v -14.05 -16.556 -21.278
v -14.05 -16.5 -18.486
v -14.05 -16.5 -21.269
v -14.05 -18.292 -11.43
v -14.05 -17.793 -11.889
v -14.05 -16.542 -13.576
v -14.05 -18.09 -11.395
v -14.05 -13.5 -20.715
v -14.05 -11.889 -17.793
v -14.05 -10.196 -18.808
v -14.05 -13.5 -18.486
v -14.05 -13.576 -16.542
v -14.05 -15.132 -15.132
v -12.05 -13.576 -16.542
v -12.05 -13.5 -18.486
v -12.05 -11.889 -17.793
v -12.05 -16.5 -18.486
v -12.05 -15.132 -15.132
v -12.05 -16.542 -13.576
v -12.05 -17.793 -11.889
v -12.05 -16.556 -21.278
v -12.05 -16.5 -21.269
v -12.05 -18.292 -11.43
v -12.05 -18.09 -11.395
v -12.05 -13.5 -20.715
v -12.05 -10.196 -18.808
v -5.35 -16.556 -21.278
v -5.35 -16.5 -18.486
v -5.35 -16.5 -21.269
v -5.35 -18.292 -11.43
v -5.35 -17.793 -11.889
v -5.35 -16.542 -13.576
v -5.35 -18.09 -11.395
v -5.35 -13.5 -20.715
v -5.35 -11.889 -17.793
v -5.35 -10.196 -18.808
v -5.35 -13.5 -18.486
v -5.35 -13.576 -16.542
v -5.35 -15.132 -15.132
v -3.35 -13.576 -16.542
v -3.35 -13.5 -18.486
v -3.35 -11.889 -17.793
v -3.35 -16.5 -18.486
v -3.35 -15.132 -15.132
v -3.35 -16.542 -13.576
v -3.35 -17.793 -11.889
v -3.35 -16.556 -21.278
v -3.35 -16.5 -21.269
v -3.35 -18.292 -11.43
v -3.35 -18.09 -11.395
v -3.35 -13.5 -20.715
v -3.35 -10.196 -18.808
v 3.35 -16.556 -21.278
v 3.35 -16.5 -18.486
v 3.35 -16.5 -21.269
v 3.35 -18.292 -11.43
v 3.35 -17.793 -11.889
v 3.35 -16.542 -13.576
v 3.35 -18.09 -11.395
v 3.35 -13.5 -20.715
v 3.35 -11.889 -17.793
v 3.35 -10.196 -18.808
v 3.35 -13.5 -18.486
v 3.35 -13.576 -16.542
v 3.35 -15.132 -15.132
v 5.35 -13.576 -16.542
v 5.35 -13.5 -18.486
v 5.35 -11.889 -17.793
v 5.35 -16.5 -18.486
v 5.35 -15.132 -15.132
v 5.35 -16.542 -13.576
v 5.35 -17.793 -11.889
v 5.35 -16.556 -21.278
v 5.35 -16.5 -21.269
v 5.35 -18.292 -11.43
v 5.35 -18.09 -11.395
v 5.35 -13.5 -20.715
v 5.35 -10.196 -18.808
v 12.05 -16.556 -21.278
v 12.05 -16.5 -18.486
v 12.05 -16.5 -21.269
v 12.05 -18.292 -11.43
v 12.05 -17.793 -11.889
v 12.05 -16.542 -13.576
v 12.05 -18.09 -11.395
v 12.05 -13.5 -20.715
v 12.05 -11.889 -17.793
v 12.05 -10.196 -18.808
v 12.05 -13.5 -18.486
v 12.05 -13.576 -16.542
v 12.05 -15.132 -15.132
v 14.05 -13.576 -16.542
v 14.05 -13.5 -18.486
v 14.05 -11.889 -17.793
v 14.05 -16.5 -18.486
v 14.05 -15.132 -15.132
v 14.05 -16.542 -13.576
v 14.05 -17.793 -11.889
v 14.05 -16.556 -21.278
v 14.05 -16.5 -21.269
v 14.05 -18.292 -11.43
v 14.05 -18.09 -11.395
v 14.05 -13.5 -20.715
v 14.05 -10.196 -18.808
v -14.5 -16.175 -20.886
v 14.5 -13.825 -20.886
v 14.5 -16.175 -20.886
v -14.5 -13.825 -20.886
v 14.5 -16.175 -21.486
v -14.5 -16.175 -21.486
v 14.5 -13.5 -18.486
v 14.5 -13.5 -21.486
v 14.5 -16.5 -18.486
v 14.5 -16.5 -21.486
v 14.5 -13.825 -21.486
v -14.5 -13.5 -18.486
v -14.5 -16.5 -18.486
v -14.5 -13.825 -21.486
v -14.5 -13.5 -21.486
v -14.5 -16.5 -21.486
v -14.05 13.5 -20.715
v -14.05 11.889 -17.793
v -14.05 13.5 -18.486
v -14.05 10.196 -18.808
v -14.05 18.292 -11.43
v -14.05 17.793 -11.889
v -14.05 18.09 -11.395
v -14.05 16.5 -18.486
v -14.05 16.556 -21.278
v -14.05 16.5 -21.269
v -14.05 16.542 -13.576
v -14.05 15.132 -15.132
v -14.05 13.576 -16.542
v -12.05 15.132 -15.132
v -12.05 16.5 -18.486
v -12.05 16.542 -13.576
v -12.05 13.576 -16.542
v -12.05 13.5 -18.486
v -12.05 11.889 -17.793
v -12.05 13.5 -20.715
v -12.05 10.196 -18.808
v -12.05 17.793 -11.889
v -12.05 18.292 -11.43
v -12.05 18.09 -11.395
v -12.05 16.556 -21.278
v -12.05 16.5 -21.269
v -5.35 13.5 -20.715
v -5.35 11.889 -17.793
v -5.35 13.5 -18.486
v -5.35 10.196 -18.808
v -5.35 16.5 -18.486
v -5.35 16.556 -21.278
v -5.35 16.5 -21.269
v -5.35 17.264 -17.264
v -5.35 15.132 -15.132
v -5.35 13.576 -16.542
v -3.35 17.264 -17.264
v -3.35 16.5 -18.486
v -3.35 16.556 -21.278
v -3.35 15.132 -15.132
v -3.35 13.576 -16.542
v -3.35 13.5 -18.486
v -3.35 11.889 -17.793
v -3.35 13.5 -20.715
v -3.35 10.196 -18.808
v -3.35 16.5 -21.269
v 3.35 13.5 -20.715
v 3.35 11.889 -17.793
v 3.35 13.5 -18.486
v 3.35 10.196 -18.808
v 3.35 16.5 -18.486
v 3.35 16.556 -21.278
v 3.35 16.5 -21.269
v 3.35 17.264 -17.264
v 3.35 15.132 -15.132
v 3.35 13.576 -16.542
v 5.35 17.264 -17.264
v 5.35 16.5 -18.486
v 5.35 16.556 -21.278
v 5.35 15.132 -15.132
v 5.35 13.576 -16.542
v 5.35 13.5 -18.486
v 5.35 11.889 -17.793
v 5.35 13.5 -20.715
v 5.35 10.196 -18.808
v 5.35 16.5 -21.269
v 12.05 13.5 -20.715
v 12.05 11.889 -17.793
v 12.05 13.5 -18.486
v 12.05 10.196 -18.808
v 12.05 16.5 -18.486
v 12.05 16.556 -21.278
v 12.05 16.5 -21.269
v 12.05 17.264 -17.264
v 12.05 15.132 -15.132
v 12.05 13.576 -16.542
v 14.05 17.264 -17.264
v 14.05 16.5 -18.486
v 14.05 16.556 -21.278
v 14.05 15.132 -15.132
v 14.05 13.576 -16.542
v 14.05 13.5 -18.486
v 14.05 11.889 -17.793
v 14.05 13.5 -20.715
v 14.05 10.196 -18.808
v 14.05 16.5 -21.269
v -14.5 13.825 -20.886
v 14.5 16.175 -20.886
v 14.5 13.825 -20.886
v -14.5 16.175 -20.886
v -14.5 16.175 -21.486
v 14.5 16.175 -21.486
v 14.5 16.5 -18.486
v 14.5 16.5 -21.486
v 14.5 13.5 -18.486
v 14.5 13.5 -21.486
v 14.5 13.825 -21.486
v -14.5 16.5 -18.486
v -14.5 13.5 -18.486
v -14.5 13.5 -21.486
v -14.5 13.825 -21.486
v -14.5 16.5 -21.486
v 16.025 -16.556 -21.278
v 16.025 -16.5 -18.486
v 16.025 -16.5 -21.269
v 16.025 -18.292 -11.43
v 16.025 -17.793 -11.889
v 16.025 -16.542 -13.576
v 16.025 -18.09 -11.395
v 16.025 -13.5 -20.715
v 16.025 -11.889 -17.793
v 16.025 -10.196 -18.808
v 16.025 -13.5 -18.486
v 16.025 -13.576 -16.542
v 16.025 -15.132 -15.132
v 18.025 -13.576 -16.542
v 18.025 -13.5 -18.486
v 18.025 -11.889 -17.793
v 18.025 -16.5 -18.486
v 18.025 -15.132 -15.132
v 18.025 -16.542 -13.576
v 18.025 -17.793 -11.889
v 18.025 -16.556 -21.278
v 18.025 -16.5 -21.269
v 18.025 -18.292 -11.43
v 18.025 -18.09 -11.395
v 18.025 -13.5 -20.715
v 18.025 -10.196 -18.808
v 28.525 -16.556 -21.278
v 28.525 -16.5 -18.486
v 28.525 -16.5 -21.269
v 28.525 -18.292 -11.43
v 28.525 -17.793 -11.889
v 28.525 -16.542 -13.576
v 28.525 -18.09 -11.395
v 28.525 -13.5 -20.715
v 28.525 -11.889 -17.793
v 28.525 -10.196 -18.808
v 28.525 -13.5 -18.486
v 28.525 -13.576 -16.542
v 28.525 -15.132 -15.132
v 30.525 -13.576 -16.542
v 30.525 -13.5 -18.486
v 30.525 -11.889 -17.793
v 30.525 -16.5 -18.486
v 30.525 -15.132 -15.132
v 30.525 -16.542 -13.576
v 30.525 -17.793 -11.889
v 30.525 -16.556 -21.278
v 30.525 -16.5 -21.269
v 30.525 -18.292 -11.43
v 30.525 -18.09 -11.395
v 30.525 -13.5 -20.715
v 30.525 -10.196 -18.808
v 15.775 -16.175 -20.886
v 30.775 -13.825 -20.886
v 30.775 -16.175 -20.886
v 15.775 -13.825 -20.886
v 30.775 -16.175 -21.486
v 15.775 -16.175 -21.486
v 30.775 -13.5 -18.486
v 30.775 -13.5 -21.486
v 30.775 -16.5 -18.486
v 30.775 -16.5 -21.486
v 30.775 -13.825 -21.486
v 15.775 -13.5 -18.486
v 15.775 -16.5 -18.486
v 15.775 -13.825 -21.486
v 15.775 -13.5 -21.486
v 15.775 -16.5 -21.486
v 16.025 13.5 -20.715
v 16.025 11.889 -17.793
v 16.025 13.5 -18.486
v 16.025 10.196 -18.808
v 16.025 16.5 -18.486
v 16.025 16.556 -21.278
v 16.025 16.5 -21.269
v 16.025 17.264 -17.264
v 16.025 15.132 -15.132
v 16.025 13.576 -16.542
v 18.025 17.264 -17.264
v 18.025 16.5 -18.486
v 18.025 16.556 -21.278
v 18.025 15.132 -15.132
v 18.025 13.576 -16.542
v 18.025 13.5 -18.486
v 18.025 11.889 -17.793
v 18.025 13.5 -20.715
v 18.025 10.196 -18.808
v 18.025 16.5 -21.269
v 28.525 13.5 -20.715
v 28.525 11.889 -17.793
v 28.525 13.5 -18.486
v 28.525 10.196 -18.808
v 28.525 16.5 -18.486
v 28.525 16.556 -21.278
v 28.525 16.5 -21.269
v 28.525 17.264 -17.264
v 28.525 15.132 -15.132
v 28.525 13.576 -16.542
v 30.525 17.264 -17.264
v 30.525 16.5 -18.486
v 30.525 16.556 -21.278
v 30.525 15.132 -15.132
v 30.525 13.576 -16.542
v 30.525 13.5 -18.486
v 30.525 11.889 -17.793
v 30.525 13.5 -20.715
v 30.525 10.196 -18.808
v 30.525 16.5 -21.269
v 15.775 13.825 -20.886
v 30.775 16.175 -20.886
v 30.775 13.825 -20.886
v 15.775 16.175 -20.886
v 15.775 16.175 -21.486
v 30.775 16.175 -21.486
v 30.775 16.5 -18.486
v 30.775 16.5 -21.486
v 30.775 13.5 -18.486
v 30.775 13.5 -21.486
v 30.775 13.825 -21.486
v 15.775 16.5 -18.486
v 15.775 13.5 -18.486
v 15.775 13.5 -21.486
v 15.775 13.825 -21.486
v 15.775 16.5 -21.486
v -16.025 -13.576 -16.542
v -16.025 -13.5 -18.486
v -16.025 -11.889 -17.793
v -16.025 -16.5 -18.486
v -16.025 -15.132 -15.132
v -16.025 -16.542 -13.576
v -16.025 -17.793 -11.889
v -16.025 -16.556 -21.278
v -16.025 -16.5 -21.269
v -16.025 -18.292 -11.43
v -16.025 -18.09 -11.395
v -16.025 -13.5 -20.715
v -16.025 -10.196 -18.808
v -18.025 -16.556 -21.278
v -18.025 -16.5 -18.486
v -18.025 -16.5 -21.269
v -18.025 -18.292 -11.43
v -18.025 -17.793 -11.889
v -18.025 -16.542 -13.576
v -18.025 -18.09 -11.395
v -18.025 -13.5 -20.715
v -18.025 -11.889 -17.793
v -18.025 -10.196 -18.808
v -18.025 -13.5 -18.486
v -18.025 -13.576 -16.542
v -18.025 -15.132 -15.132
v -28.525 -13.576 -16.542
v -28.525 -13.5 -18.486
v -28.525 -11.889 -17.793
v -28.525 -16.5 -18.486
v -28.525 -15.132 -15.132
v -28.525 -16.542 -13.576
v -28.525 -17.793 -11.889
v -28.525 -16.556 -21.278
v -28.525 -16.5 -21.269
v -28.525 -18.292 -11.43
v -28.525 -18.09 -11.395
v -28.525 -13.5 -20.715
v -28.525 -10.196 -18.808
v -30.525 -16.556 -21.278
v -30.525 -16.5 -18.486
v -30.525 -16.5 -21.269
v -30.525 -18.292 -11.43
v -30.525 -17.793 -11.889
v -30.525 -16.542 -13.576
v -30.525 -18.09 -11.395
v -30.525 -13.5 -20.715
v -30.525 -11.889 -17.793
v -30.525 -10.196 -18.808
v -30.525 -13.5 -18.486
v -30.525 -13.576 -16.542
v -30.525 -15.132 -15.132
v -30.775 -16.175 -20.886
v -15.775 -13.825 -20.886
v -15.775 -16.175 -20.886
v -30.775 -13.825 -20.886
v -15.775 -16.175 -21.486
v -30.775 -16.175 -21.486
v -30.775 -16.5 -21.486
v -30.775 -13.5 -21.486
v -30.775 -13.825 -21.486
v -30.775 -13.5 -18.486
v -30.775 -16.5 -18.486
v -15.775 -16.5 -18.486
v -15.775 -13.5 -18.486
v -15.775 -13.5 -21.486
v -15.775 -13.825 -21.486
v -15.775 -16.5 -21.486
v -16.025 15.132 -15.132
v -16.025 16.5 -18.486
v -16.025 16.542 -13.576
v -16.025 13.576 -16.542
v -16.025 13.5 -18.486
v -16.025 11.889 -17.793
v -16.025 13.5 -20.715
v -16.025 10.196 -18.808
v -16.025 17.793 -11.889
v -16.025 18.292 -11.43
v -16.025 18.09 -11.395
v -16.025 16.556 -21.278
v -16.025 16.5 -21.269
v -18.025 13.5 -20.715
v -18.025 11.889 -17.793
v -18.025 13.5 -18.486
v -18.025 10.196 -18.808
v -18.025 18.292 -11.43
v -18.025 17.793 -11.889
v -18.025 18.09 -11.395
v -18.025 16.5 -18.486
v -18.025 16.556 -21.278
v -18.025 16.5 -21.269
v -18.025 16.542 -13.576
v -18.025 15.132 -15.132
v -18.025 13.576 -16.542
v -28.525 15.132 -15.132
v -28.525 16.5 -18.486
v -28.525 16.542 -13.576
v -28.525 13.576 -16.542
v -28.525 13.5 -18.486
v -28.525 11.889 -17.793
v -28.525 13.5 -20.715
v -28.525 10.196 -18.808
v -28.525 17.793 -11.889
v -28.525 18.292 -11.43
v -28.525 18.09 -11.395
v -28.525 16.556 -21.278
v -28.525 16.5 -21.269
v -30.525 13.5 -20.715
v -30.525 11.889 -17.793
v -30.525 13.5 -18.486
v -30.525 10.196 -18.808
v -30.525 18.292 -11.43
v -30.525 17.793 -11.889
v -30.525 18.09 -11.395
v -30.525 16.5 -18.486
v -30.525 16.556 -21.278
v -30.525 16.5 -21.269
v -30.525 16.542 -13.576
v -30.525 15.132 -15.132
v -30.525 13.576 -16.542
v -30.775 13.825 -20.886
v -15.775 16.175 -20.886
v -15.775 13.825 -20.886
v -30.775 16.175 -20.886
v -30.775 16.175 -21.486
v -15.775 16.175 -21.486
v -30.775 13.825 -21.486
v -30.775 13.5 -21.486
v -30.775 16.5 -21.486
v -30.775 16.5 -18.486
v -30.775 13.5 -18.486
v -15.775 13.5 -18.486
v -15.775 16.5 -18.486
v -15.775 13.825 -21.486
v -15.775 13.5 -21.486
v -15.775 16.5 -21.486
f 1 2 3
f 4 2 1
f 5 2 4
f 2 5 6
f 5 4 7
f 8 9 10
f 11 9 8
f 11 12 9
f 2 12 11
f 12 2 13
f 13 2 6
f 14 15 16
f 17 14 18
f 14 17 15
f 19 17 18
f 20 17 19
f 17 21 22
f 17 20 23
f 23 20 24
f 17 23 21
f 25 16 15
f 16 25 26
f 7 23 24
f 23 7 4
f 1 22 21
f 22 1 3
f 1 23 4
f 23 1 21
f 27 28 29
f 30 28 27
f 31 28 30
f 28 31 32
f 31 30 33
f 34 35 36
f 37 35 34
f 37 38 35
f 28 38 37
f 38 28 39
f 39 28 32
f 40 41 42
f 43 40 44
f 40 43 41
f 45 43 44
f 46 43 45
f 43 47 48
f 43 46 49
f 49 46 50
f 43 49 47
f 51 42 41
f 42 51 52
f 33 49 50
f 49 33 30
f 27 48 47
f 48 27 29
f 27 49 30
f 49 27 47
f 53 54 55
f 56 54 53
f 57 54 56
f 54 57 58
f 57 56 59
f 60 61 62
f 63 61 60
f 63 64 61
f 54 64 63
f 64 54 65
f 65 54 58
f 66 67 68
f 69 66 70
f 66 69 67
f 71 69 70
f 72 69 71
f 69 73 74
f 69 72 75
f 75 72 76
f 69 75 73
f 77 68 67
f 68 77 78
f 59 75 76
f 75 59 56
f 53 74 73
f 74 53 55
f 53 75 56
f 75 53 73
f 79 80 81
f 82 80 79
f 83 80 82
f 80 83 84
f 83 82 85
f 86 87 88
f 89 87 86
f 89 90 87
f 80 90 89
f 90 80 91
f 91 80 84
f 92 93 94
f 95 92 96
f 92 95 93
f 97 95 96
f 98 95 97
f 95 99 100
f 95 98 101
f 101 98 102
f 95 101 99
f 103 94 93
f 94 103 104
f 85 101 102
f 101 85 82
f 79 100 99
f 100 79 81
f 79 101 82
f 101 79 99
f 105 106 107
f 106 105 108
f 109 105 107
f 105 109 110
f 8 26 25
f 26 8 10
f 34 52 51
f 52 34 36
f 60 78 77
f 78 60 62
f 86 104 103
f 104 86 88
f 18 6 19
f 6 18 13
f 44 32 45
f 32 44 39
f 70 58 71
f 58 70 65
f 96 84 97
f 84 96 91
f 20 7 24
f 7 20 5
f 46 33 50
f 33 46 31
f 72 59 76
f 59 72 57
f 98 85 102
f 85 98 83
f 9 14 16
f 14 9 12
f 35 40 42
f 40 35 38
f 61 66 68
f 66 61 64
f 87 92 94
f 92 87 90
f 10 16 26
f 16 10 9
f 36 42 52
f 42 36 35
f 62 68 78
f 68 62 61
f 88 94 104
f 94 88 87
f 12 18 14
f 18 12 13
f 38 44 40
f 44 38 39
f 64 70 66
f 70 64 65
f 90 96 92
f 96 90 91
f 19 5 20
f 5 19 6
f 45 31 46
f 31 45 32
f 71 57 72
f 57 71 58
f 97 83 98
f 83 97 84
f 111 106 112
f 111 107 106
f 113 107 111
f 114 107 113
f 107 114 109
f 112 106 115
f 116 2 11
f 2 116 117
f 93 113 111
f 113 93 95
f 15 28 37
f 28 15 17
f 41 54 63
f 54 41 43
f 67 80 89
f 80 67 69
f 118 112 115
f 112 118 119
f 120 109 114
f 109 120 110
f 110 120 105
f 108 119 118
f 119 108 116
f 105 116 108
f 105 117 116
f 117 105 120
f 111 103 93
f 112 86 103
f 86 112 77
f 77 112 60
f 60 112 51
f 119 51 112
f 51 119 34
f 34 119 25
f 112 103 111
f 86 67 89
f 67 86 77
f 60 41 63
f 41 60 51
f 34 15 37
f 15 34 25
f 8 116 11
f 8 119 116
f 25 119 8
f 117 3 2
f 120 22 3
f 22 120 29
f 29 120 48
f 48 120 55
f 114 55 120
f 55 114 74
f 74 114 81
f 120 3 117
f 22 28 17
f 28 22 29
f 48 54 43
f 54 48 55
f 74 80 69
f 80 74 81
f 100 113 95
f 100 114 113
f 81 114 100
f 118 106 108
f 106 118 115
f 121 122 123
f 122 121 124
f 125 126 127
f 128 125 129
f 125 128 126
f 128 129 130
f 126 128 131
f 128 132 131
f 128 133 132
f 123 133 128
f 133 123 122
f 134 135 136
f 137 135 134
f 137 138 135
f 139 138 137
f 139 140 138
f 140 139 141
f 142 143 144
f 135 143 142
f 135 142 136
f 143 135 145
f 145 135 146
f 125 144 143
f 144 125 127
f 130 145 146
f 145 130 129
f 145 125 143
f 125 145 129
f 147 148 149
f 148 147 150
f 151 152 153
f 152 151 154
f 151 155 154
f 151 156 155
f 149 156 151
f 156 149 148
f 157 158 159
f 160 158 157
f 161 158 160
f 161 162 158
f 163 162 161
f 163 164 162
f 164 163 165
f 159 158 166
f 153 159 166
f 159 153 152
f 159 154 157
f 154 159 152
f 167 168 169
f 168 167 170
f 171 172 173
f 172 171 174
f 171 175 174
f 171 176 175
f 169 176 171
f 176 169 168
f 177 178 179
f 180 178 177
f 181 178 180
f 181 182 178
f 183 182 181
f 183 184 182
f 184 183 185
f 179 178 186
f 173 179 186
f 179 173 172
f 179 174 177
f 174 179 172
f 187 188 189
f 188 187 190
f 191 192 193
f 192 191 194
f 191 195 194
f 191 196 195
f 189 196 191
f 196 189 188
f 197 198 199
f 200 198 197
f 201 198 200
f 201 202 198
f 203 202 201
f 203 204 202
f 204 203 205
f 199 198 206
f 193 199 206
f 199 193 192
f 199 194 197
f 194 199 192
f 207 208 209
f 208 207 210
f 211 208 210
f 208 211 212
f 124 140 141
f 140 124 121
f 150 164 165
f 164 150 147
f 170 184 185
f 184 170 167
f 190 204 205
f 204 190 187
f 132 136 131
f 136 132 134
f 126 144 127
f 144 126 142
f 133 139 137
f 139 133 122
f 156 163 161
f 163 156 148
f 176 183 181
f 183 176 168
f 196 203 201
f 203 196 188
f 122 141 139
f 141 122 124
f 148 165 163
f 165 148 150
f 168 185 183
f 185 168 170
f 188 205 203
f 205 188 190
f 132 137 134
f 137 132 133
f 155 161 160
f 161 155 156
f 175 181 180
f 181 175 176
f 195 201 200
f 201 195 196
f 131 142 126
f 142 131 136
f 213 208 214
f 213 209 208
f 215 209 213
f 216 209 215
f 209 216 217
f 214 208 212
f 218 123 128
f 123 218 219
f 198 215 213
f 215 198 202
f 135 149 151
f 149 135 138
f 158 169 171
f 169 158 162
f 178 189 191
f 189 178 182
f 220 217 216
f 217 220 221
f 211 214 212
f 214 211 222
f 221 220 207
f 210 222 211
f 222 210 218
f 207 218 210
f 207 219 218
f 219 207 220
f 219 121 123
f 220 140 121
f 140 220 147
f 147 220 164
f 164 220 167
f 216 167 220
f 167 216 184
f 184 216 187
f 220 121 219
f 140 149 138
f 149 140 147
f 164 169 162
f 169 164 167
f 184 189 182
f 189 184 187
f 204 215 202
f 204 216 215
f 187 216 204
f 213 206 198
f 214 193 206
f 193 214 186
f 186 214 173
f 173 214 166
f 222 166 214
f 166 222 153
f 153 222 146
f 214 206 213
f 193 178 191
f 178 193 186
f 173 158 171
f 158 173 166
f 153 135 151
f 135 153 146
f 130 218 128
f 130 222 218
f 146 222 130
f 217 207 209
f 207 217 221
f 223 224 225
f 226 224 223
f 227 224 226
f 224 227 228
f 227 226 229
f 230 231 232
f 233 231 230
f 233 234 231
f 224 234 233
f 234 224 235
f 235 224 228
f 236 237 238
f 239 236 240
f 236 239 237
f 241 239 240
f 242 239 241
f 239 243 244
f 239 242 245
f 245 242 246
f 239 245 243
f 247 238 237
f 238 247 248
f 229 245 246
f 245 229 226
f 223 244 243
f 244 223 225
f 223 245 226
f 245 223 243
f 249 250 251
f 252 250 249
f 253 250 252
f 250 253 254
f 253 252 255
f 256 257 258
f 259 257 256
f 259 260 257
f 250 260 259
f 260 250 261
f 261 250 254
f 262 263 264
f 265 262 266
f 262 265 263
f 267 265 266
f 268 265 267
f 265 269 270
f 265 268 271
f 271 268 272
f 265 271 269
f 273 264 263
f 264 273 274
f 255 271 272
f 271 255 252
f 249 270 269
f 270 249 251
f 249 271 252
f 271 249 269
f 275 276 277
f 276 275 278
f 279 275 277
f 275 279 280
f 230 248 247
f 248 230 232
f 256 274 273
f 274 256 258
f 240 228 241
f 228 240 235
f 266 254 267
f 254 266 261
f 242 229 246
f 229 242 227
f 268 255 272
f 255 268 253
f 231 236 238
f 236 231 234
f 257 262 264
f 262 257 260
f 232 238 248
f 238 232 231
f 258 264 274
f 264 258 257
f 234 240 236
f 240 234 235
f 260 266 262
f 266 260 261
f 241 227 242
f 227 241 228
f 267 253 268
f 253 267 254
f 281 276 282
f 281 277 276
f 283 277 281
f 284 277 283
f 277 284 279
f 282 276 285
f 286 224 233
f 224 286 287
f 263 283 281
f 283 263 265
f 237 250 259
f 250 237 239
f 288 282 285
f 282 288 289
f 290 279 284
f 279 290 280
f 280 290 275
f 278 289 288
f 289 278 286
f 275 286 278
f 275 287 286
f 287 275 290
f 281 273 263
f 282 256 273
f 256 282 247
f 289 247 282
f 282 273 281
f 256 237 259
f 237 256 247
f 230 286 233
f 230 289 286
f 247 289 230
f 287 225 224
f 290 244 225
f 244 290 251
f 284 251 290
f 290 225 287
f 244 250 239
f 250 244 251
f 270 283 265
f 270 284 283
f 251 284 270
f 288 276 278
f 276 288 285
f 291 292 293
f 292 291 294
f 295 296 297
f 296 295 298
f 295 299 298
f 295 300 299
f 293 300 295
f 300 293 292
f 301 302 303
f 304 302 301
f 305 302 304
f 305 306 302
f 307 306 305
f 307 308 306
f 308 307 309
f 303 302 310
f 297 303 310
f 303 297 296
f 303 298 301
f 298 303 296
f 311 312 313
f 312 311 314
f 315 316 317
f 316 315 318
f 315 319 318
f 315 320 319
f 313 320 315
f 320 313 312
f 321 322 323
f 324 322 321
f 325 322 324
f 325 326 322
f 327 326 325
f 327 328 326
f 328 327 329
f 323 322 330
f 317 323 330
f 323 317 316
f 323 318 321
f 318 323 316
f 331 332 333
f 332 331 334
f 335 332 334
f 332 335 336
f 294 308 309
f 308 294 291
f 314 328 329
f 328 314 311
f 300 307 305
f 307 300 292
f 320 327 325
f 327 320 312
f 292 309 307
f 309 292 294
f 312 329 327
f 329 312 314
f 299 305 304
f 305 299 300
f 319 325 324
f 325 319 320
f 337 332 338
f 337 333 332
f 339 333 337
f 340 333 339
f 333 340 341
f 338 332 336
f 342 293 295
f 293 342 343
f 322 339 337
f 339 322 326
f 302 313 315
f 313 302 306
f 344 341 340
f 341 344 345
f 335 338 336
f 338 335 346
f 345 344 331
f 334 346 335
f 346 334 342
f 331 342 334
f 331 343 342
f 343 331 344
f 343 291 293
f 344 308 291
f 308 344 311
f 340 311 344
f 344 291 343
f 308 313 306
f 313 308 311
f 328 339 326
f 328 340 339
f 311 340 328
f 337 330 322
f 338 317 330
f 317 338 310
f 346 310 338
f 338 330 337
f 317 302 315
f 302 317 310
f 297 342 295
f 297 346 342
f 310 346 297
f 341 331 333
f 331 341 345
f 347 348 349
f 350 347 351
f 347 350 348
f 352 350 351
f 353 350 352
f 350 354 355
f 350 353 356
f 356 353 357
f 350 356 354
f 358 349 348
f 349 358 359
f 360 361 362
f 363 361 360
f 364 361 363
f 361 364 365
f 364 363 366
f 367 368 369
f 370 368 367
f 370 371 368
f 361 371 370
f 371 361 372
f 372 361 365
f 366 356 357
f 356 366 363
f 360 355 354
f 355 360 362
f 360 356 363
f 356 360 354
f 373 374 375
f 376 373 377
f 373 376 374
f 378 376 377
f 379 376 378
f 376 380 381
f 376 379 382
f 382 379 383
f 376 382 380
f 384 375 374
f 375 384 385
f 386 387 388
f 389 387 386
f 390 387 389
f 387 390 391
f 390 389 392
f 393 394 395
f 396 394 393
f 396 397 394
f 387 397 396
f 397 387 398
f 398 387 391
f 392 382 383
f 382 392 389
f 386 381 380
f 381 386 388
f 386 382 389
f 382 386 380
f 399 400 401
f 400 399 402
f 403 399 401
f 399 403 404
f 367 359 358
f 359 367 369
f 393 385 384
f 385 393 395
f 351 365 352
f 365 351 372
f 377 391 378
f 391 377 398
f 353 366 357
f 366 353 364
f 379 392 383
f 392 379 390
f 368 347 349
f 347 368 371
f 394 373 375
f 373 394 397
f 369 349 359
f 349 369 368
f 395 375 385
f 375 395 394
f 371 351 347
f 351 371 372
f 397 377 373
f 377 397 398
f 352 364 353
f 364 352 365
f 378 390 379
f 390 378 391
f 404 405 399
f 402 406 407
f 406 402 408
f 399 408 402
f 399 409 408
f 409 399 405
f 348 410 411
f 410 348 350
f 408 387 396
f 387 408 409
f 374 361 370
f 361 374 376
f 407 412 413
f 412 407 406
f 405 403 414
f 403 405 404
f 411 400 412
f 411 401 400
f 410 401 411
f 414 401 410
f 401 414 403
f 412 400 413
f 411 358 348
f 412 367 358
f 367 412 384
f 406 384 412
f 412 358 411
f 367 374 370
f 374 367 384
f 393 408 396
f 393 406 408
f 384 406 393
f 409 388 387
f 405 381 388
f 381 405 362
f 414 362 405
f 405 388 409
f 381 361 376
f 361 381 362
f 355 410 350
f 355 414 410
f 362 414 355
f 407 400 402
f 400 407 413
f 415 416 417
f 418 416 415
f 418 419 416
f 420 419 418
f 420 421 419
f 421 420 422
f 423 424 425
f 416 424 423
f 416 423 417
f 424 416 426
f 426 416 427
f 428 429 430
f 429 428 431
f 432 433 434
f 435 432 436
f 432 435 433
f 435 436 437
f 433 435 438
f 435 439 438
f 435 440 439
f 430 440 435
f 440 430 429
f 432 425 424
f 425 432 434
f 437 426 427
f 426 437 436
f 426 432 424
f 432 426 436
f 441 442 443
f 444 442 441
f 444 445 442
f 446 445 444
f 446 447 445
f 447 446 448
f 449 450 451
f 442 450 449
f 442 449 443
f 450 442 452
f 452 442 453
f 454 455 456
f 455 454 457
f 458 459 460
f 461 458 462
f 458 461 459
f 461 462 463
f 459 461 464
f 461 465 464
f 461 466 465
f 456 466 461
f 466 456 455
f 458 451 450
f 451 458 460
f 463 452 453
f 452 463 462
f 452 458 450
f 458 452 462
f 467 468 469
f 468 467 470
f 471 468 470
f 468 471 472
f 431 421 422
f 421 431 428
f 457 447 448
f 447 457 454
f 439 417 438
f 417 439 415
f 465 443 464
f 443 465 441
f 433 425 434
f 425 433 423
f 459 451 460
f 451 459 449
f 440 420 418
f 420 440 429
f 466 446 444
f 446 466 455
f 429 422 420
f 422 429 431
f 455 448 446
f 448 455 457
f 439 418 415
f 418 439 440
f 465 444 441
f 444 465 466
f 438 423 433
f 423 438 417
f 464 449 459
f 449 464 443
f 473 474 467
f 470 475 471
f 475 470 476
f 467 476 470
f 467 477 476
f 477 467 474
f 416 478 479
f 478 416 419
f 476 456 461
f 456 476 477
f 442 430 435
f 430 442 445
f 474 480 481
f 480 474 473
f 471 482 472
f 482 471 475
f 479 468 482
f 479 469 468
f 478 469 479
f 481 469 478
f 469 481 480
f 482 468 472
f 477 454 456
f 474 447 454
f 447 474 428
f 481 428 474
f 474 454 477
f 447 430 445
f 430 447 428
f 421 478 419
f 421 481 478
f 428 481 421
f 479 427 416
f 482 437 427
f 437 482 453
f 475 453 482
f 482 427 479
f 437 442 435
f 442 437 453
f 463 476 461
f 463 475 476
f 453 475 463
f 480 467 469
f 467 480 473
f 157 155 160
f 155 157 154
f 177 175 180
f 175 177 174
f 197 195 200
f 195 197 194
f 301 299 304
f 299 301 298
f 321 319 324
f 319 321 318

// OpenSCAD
//===================================================//
// Simplified, FDM 3D printable ATLAS model
// Based on the ATLAS TDR:s from mid 1990:s
//
// Written by Henrik Åkerstedt (Stockholm University)
// with invaluable assistance from Sam Silverstein
//
// This documentation describes Open Hardware and is licensed under the CERN OHL v. 1.2.
// You may redistribute and modify this documentation under the terms of the
// CERN OHL v.1.2. (http://ohwr.org/cernohl). This documentation is distributed
// WITHOUT ANY EXPRESS OR IMPLIED WARRANTY, INCLUDING OF MERCHANTABILITY,
// SATISFACTORY QUALITY AND FITNESS FOR A PARTICULAR PURPOSE.
// Please see the CERN OHL v.1.2 for applicable conditions
//
//
// Version history
//
// 0.11 - Increased tolerences of the feet assembly and outer spectrometer
// 0.10 - Made part settings more modular and implemented arbitrary cut angle to MirrDupCut
// 0.9 - All parts are exportable as STLfree. Added 
// 0.8 - Removed muon tiles (inner barrel) intersecting with tile rails. Added rail support for endcap magnet.
// 0.7 - Changed MirrorDupCut to mirror along Z instead of rotate Y-axis. Added Tile rail support and muon system options
// 0.6 - Improved TRT, LAr, EndCap and FCal
// 0.5 - Added fingers and rendering options for Tile to render LongBarrel or ExtendedBarrel
// 0.4 - Added defaultRes option to limit number of faces
// 0.3 - Added rendering options for feet (CERNFeet("RTB") is used to render Rail, Top and Feet respectively)
// 0.2 - Added holes in muon part BO and BI to allow for feet
// 0.1 - Initial release
//===================================================//


modelScale = 200; // Set to 1 for full scale, 200 fits Ultimaker 3D printer
defaultRes = 1; // Set to 1 for lower resolution, 0 for default

// Available parts:
//BeamPipe
//InnerDetector		"PRT"		Pixel Sct Trt
//Calorimeters		"LHFTER"		Lar Hadronic-endcap Forward Tile Extended-tile Rail(only)
//MagnetSystem		"CBE"		Central Barrel Endcap
//MuonDetector		"IOMSLF"		Inner-barrel Outer-barrel Middle-wheel Small-outer-wheel Large-outer-wheel Forward-shield
//CERNFeet			"RTB"		Rail Top Bottom


feetPos=[0,-(2825+600),2825+600,-(6150+600),6150+600,-(8940+600),8940+600,-(11480+600),11480+600];
difference(){
	scale([1,1,1]/modelScale){
//		MirrDupCut()			BeamPipe();
//		MirrDupCut(0,30,-30)	InnerDetector("ST");
//		MirrDupCut(700,35,-35)	Calorimeters("L");
		MirrDupCut(1500,45,-45)	Calorimeters("R");
//		MirrDupCut(5400,60,-60)	MagnetSystem("B");
//		MirrDupCut(0)			MagnetSystem("E");
//		MirrDupCut(3000,50,-50)	MuonSpectrometer("I");
//		MirrDupCut(7000,80,-80)	MuonSpectrometer("O");
//		MirrDupCut(0,90,-90)	MuonSpectrometer("M");
//		MirrDupCut()			MuonSpectrometer("SLF");
//		MirrDupCut()			CERNFeet("B");
	}
	rotate([0,90,0]) cylinder(h=50000/modelScale, r=1, center=true, $fn=8);
}

// Mirrors a part about the origin and inserts cut with start at "origin" with cut angles "angle1" and "angle2" from y-axis and  extending "length" from "origin"
module MirrDupCut(origin=-1,angle1=45, angle2=-45,length=40000){
	difference(){
		for (i = [0 : $children-1]){
			union(){
				child(i);
				mirror([1,0,0]) child(i);
			}
		}
		if (origin>=0) translate([-origin,0,0]) mirror([1,0,0]) rotate([0,-90,0]) linear_extrude(height=length, convexity=10, $fn=100){
			polygon(points=[[0,0],25000*[sin(angle1),cos(angle1)],25000*[sin(angle1),1],25000*[sin(angle2),1],25000*[sin(angle2),cos(angle2)],[0,0]]);
		}
	}
}

module BeamPipe(){
	rotate([0,90,0]) color("yellow") difference(){
		cylinder(h=3512*2, r=36, center=true);
		cylinder(h=3520*2, r=29, center=true);
	}
}

module InnerDetector(str){
	if (search("P",str,1)!=[]) Pixel();
	if (search("S",str,1)!=[]) SCT();
	if (search("T",str,1)!=[]) TRT();
}

module Calorimeters(str){
	if (search("L",str,1)!=[]) LAr();
	if (search("H",str,1)!=[]) LArEC();
	if (search("F",str,1)!=[]) FCal();
	if (search("T",str,1)!=[]) Tile("T");
	if (search("E",str,1)!=[]) Tile("E");
	if (search("R",str,1)!=[]) Tile("R");
}

module MagnetSystem(str){
	if (search("C",str,1)!=[]) CentralSolenoid();
	if (search("B",str,1)!=[]) BarrelToroid(defaultRes);
	if (search("E",str,1)!=[]) EndCap();
}

module MuonSpectrometer(str){
	if (search("I",str,1)!=[]) difference(){
		BI();
		MuonSpectrometerFeet();
	}
	if (search("O",str,1)!=[]) difference(){
		BO();
		MuonSpectrometerFeet();
	}
	if (search("M",str,1)!=[]) EM();
	if (search("S",str,1)!=[]) EOS();
	if (search("L",str,1)!=[]) FOL();
	if (search("F",str,1)!=[]) ForwardShield();
}

module Pixel(){
	rotate([0,90,0]) color("lightgray") difference(){
		cylinder(h=400.5*2, r=122.5, center=true);
		cylinder(h=500.5*2, r=50.5, center=true);
	}
	rotate([0,90,0]) color("lightgray") difference(){
		cylinder(h=650, r=149.6);
		cylinder(h=595, r=149.6);
		cylinder(h=550, r=88.8);
	}
}

module SCT(){
	rotate([0,90,0]) color("white") difference(){
		cylinder(h=749*2, r=514, center=true);
		cylinder(h=849*2, r=299, center=true);
	}
	rotate([0,90,0]) color("white") difference(){
		cylinder(h=2735, r=560);
		cylinder(h=839, r=560);
		cylinder(h=2735, r=275);
	}
}

module TRT(){
	rotate([0,90,0]) color("darkgray") difference(){
		cylinder(h=790*2, r=1070, center=true, $fn=16);
		cylinder(h=890*2, r=550, center=true, $fn=16);
	}

	rotate([0,90,0]) translate([0,0,790]) color("darkgray") difference(){
		cylinder(h=2800-790, r=1050, $fn=16);
		cylinder(h=2900-790, r=620, $fn=16);
	}

	rotate([0,90,0]) translate([0,0,2800]) color("darkgray") difference(){
		cylinder(h=3400-2800, r=1050, $fn=16);
		cylinder(h=3500-2800, r=480, $fn=16);
	}
}

module LAr(){
	rotate([0,90,0]) color("gold") difference(){
		union(){
			cylinder(h=2950*2, r=2200, center=true);
			translate([0,0,2950]) cylinder(h=3390-2950, r=2775);
		}
		cylinder(h=3400*2, r=1150, center=true);
		translate([0,0,3390-1400]) cylinder(h=1500, r1=0, r2=1500);
	}
}

module LArEC(){
	rotate([0,90,0]) color("gold") difference(){
		translate([0,0,3500]) cylinder(h=760, r=2010);
		cylinder(h=3500+760, r1=0, r2=370);
	}
	rotate([0,90,0]) color("gold") difference(){
		union(){
			translate([0,0,3500+760]) cylinder(h=1908, r=2200);
			translate([0,0,3500+3165-535]) cylinder(h=535, r=2475);
		}
		translate([0,0,3500+760]) union(){
			cylinder(h=1908, r=366);
			translate([0,0,500]) cylinder(h=1908-500, r=474);
			translate([0,0,804.5]) cylinder(h=1908-804.5, r=517);
			translate([0,0,804.5+600]) cylinder(h=1908-804.5, r=548);
		}
	}
}

module FCal(){
	rotate([0,90,0]) translate([0,0,3623+630+20+500+40]) color("gold") difference(){
		union(){
			cylinder(h=1908-500, r=474-20);
			translate([0,0,450])cylinder(h=1908-500-450, r=517-20);
			translate([0,0,450+450])cylinder(h=1908-500-450-50, r=548-20);
		}
		union(){
			cylinder(h=1908, r=70);
			translate([0,0,450]) cylinder(h=1908-500, r=80);
			translate([0,0,450+450]) cylinder(h=1908-500, r=86);
			translate([0,0,450+450+450]) cylinder(h=1908-500, r=95);
			translate([0,0,450+450+450+460-150]) cylinder(h=150, r=190);
		}
	}
}

module Tile(str){
	if (search("T",str,1)!=[] || search("E",str,1)!=[]) difference(){
		rotate([0.5/64*360,0,0]) union(){
			if (search("T",str,1)!=[]){
				rotate([0,90,0]) color("gray") difference(){
					cylinder(h=2820, r=4250, $fn=64);
					cylinder(h=2820, r=2350, $fn=64);
				}
			}
			if (search("E",str,1)!=[]){
				rotate([0,90,0]) color("gray") difference(){
					cylinder(h=6110, r=4250, $fn=64);
					cylinder(h=3200, r=4250, $fn=64);
					cylinder(h=6110, r=2350, $fn=64);
					cylinder(h=3424, r=3424, $fn=64);
					cylinder(h=3520, r=2974, $fn=64);
				}
			}
		}
		for (i=[0:63]){
			rotate([(i+0.5)/64*360]) translate([0,0,4250-25]) cube([2*(6120),150,50], center=true);
		}
	}
	if (search("E",str,1)!=[]){
		for (i=[0:63]){
			rotate([(i)/64*360]) translate([3010,0,4250-150]) cube([380,300,300], center=true);
		}
	}
	if (search("T",str,1)!=[] || search("R",str,1)!=[]){
		TileLongRail();
		mirror([0,1,0]) TileLongRail();
	}
	if (search("E",str,1)!=[] || search("R",str,1)!=[]){
		TileExtendedRail();
		mirror([0,1,0]) TileExtendedRail();
	}
}

module TileLongRail(){ //rail size 430x530, origin at top center of rail
	translate([0,-3000,-(9400/2*cos(22.5))-385+530]){
		difference(){
			for(i = [0:3]){
				translate([-2610+1740*i,500,1100]) rotate([10,0,0]) cube([400,2000,2000], center=true);
			}
			translate([0,0,-50]) cube([2900*2,430+2*20,100+2*20], center=true);
			translate([0,0,-350]) rotate([30,0,0]) cube([2820*2,4000,400], center=true);
			translate([-2820,3000,(9400/2*cos(22.5))+385-530]) rotate([0,90,0]) cylinder(h=2820*2, r=4250+30, $fn=64);
			
		}
		difference(){
			translate([0,0,250-50]) cube([2900*2,600,500+100],center=true);
			translate([0,0,-50]) cube([2900*2,430+2*20,100+2*20], center=true);
		}
	}
}

module TileExtendedRail(){ //rail size 430x530, origin at top center of rail
	translate([3200,-3000,-(9400/2*cos(22.5))-385+530]){
		difference(){
			for(i = [-1,1]){
				translate([2910/2+i*1250,500,1100]) rotate([10,0,0]) cube([400,2000,2000], center=true);
			}
			translate([3000/2,0,-50]) cube([3000,430+2*20,100+2*20], center=true);
			translate([3000/2,0,-350]) rotate([30,0,0]) cube([3000,4000,400], center=true);
			translate([0,3000,(9400/2*cos(22.5))+385-530]) rotate([0,90,0]) cylinder(h=3000, r=4250+30, $fn=64);
		}
		difference(){
			translate([2910/2,0,250-50]) cube([3000,600,500+100],center=true);
			translate([2910/2,0,-50]) cube([3000,430+2*20,100+2*20], center=true);
		}
	}
}

module CentralSolenoid(){
	rotate([0,90,0]) color("gold") difference(){
		cylinder(h=2650, r=1292);
		cylinder(h=2650, r=1267);
	}
}

module EndCap(){
	translate([10130,0,0]) rotate([0,90,0]) difference(){
		linear_extrude(height = 5000, center = true, convexity = 10) import(file = "EndCap.dxf", layer="EndCap");
		cylinder(h=5200, r=1650/2, center=true);
	}
	for(i=[-1,1]) translate([10130,i*-3000,-(9400/2*cos(22.5))-385+530]) difference(){
		translate([0,0,250-50]) cube([5000,600,500+100],center=true);
		translate([0,0,-50]) cube([5000,430+2*20,100+2*20], center=true);
	}
}

module BarrelToroid(defaultRes){
	strutPos = [1712.5,5137.5,8245.5,10845];
	for(i = [0:7]){
		rotate([22.5+45*i,0,0]) union(){
			BarrelToroidHalf(defaultRes);
			translate([0,0,9400/2+1100/2+5320-1100]) rotate([180,0,0]) translate([0,0,-9400/2-1100/2]) BarrelToroidHalf(defaultRes);
			for(j=[0:3]){
				rotate([-22.5,0,0]) translate([strutPos[j],0,8650]) cube([400,7700,600], center=true);
			}
		}
	}
}

module BarrelToroidHalf(defaultRes){
	difference(){
		union(){
			translate([12630-1100/2,0,9400/2]) cylinder(h=5320/2, r=1100/2, $fn=defaultRes*12);
			translate([0,0,9400/2+1100/2]) rotate([0,90,0]) cylinder(h=12630, r=1100/2, $fn=defaultRes*12);
			translate([12630-1100/2-1100/4,0,9400/2+1100/2+1100/4]) rotate([0,45,0]) cylinder(h=4000, r=1100/2, center=true, $fn=defaultRes*12);
		}
		difference(){
			translate([12630-1100/2-1100/4,0,9400/2+1100/2+1100/4]) rotate([0,45,0]) translate([1000,0,1000]) cube([2000,2000,4000], center=true);
			translate([12630-1100/2-1100/4,0,9400/2+1100/2+1100/4]) rotate([0,45,0]) cylinder(h=4000, r=1100/2, center=true, $fn=defaultRes*12);
		}
		difference(){
			translate([12630-1100/2+1000,0,9400/2]) cube([2000,2000,6000], center=true);
			translate([12630-1100/2,0,9400/2]) cylinder(h=5320, r=1100/2, $fn=defaultRes*12);
		}
		difference(){
			translate([12630,0,9400/2+1100/2-1000]) rotate([0,90,0]) cube([2000,2000,6000], center=true);
			translate([0,0,9400/2+1100/2]) rotate([0,90,0]) cylinder(h=12630, r=1100/2, $fn=defaultRes*12);
		}
	}
}

module BI(){
	for(i=[0:7]){
		rotate([45*i,0,0]) translate([6550/2,0,4800]){
			difference(){
				cube([6550,2700,400],center=true);
				translate([-6550/2,0,200]) rotate([0,45,0]) cube([100,6000,100], center=true);
				translate([-6550/2,0,-200]) rotate([0,45,0]) cube([100,6000,100], center=true);
				for(j=[0:4]){
					translate([-6550/2+900+1080*j,0,400/2]) rotate([0,45,0]) cube([100,6000,100], center=true);
					translate([-6550/2+900+1080*j,0,-400/2]) rotate([0,45,0]) cube([100,6000,100], center=true);
				}
			}
		}
		rotate([22.5+45*i,0,0]) translate([6550/2,0,4525]){
			difference(){
				cube([6550,1700,300],center=true);
				for(j=[0:6]){
					translate([-6550/2+900*j,0,300/2]) rotate([0,45,0]) cube([100,6000,100], center=true);
					translate([-6550/2+900*j,0,-300/2]) rotate([0,45,0]) cube([100,6000,100], center=true);
				}
			}
		}
	}
}

module BO(){
	for(i=[0:7]){
		rotate([45*i,0,0]) translate([12000/2,0,9477]){
			difference(){
				cube([12000,5900,600],center=true);
				translate([-12000/2,0,300]) rotate([0,45,0]) cube([200,6000,200], center=true);
				translate([-12000/2,0,-300]) rotate([0,45,0]) cube([200,6000,200], center=true);
				for(j=[0:4]){
					translate([-12000/2+1680+2160*j,0,600/2]) rotate([0,45,0]) cube([200,6000,200], center=true);
					translate([-12000/2+1680+2160*j,0,-600/2]) rotate([0,45,0]) cube([200,6000,200], center=true);
				}
			}
		}
		rotate([22.5+45*i,0,0]) translate([12000/2,0,10350]){
			difference(){
				cube([12000,3800,511],center=true);
				for(j=[0:5]){
					translate([-12000/2+2160*j,0,511/2]) rotate([0,45,0]) cube([200,6000,200], center=true);
					translate([-12000/2+2160*j,0,-511/2]) rotate([0,45,0]) cube([200,6000,200], center=true);
				}
			}
		}
	}
}


module EM(){
	for(i=[0:7]){
		rotate([45*i,0,0]) translate([13842,0,0]){
//			difference(){
				rotate([90,0,90]) linear_extrude(height=400, center=true, convexity=10, $fn=100){
					polygon(points=[[1108/2,1735],[5946/2,11190],[-5946/2,11190],[-1108/2,1735]]);
				}
//				rotate([90,0,90]) for(j=[0:3]){
//					translate([1735+1680+1920*j,0,400/2]) rotate([0,45,0]) cube([100,6000,100], center=true);
//					translate([1735+1680+1920*j,0,-400/2]) rotate([0,45,0]) cube([100,6000,100], center=true);
//				}
//			}
		}
		rotate([22.5+45*i,0,0]) translate([13448,0,0]){
			rotate([90,0,90]) linear_extrude(height=400, center=true, convexity=10, $fn=100){
				polygon(points=[[754/2,1735],[3761/2,11430],[-3761/2,11430],[-754/2,1735]]);
			}
		}
	}
}

module EOS(){
	for(i=[0:7]){
		rotate([45*i,0,0]) translate([21000-600,0,0]){ //22498
			rotate([90,0,90]) linear_extrude(height=400, center=true, convexity=10, $fn=100){
				polygon(points=[[1932/2,2985],[4119/2,7335],[-4119/2,7335],[-1932/2,2985]]);
			}
		}
		rotate([22.5+45*i,0,0]) translate([21000-200,0,0]){ //22838
			rotate([90,0,90]) linear_extrude(height=400, center=true, convexity=10, $fn=100){
				polygon(points=[[1319/2,2935],[2630/2,7285],[-2630/2,7285],[-1319/2,2935]]);
			}
		}
	}
}

module FOL(){
	for(i=[0:7]){
		rotate([45*i,0,0]) translate([21000-1400,0,0]){ //20832
			rotate([90,0,90]) linear_extrude(height=400, center=true, convexity=10, $fn=100){
				polygon(points=[[3699/2,6520],[5946/2,11590],[-5946/2,11590],[-3699/2,6520]]);
			}
		}
		rotate([22.5+45*i,0,0]) translate([21000-1000,0,0]){ //21200
			rotate([90,0,90]) linear_extrude(height=400, center=true, convexity=10, $fn=100){
				polygon(points=[[2460/2,6760],[4058/2,12070],[-4058/2,12070],[-2460/2,6760]]);
			}
		}
	}
} //21400

module ForwardShield(){
	difference(){
		union(){
			translate([7700,0,0]) rotate([0,90,0]) cylinder(r=1600/2, h=5200);
			translate([7700+5200,0,0]) rotate([0,90,0]) cylinder(r=1735, h=1400);
			translate([14300,0,0]) rotate([0,90,0]) cylinder(r=2500, h=17000-14300);
			translate([17000,0,0]) rotate([0,90,0]) cylinder(r=2800, h=19000-17000);
			translate([19000,0,0]) rotate([0,90,0]) cylinder(r=2935, h=21000-19000);
			translate([21000,0,0]) rotate([0,90,0]) cylinder(r=4000, h=22000-21000);
		}
		translate([16000,0,0]) rotate([0,90,0]) cylinder(r=200, h=18000, center=true);	
	}
}

module MuonSpectrometerFeet(){
	for (i=[-1,1]){
		rotate([45*(4+i),0,0]) translate([0,i*1600/2,4800]) cube([6600*2,2700-1580,500],center=true);
		translate([0,i*(-50-3000),1100-(9400/2*cos(22.5))-385+530]) rotate([i*10,0,0]) cube([15000,1000,2000], center=true);
		translate([0,i*-3000,50-(9400/2*cos(22.5))-385+530]) rotate([i*30,0,0]) cube([15000,4000,400], center=true);
		rotate([i*22.5,0,0]) translate([0,-i*200,-2200-4220/2-(9400/2+1100/2)]) cube([25000,1550,1000], center=true);
	}
	for (i=[0:6]){
		translate([feetPos[i],0,0]) rotate([-22.5,0,0]) translate([0,1100/2+100,-2200-4220-(9400/2+1100/2)]) rotate([22.5,0,0]){
			translate([0,0,3000/2-500]) cube([1200,1900,1000], center=true);
			rotate([-22.5,0,0]) translate([0,-1100/2-100,4220/2]) cube([1200,1550,3000], center=true);
		}
		translate([feetPos[i],0,0]) rotate([-22.5,0,180]) translate([0,1100/2+100,-2200-4220-(9400/2+1100/2)])rotate([22.5,0,0]){
			translate([0,-100,3000/2-500]) cube([1200,1900,1000], center=true);
			rotate([-22.5,0,0]) translate([0,-1100/2-100,4220/2]) cube([1200,1550,2000], center=true);
		}
	}
}

module CERNFeet(str){
	if (search("R",str,1)!=[]){
		Rail();
		rotate([0,0,180]) Rail();
	}
	for (i=[0:6]) {
		translate([feetPos[i],0,0]) {
			if (search("T",str,1)!=[]){
				CERNFeetT();
				rotate([0,0,180]) CERNFeetT();
			}
			if (search("B",str,1)!=[]){
				CERNFeetB();
				rotate([0,0,180]) CERNFeetB();
			}
		}
	}
}

module Rail(){
	translate([0,-3000,-(9400/2*cos(22.5))-385]) rotate([90,0,90]) translate([-430/2,0,0]) linear_extrude(height=2*12630, center=true, convexity=10, $fn=100){
				polygon(points=[[0,0],[430,0],[430,130],[430-130,130],[430-130,130+270],[430,130+270],[430,2*130+270],[0,2*130+270],[0,130+270],[130,130+270],[130,130],[0,130],[0,0]]);
	}
	for (i=[0:6]) {
		translate([feetPos[i],0,0]) {
			translate([0,-3000,-(9400/2*cos(22.5))-385-1200/2]) cube([600,430,1200], center=true);
		}
	}
}

module CERNFeetT(){
	difference(){
		rotate([-22.5,0,0]) translate([0,1100/2+100,-2200-4220-(9400/2+1100/2)]) rotate([22.5,0,0]){
			rotate([-22.5,0,0]) translate([0,-1100-200,5140/2+1400+150]) cube([1200,200,5140-300], center=true);
			difference(){
				union(){
					rotate([-22.5,0,0]) translate([0,-1100/2-100,2200+4220/2]) cube([1000,1100,4220], center=true);
//					rotate([-22.5,0,0]) translate([0,-1100/2-100-250,2200]) cube([500,600,600], center=true);
					rotate([-22.5,0,0]) translate([0,-1100-100,1900]) cube([500,400,400], center=true);
				}
				rotate([-22.5,0,0]) translate([0,-1100/2-100,2200+4220]) rotate([0,90,0]) cylinder(r=1200/2, h=2000, center=true);
				rotate([-22.5,0,0]) translate([0,-1100/2-100,2200]) rotate([0,90,0]) cylinder(r=1200/2, h=2000, center=true);
				rotate([-22.5,0,0]) translate([0,-250,5900+50+250]) cube([1200,300,500], center=true);
				rotate([-22.5,0,0]) translate([0,-200,4000]) cube([300,600,2200], center=true);
			}
		}
		translate([0,-3000,-(9400/2*cos(22.5))-385-1200/2]) cube([700,430+20+50,1250], center=true);
	}
}

module CERNFeetB(){
	rotate([-22.5,0,0]) translate([0,1100/2+100,-2200-4220-(9400/2+1100/2)]) rotate([22.5,0,0]){
	rotate([-22.5,0,0]) translate([0,0,5900/2+50-500]) cube([1200,200,6900], center=true);
	rotate([-22.5,0,0]) translate([0,-200,4000]) cube([200,500,2000], center=true);
	translate([0,-100,100-1000]) cube([2000,2000,200], center=true);
	difference(){
		union(){
			translate([400,-100,3000/2-500]) cube([200,1800,4000], center=true);
			translate([-400,-100,3000/2-500]) cube([200,1800,4000], center=true);
		}
		rotate([-22.5,0,0]) translate([0,-1100-200-500,0]) cube([1200,800,6000], center=true);
		rotate([-22.5,0,0]) translate([0,-1100/2-100,2200]) rotate([0,90,0]) cylinder(r=1200/2, h=2000, center=true);
		rotate([-22.5,0,0]) translate([0,-1100/2-100,2200+2000/2]) cube([2000,1100,2000], center=true);
		rotate([-22.5,0,0]) translate([0,-1100-200,5140/2+1400+150]) cube([1200,250,5140-300], center=true);
	}}
}

module Pillar(){
	rotate([90,0,0]) difference(){
		linear_extrude(height=900, center=true, convexity=10, $fn=100){
			polygon(
				points=[[0,0],[1900,0],[900,2500],[900,5568+150],[900,5568+150]+(904+1700)*[cos(22.5),sin(22.5)],[0,5568+200+1695]+(1030+1700)*[cos(22.5),sin(22.5)],[0,5568+200+1695]]);
		}
		translate([0,5568+200+1695]) rotate([0,0,22.5]) translate([1030+1700-(1088-550),-1868/2]) cylinder(r=550, h=1000, center=true);
		translate([0,5568+200+1695]) rotate([0,0,22.5]) translate([1030+1700,-1868/2]) cube([1100,1100,1000], center=true);
	}
}
